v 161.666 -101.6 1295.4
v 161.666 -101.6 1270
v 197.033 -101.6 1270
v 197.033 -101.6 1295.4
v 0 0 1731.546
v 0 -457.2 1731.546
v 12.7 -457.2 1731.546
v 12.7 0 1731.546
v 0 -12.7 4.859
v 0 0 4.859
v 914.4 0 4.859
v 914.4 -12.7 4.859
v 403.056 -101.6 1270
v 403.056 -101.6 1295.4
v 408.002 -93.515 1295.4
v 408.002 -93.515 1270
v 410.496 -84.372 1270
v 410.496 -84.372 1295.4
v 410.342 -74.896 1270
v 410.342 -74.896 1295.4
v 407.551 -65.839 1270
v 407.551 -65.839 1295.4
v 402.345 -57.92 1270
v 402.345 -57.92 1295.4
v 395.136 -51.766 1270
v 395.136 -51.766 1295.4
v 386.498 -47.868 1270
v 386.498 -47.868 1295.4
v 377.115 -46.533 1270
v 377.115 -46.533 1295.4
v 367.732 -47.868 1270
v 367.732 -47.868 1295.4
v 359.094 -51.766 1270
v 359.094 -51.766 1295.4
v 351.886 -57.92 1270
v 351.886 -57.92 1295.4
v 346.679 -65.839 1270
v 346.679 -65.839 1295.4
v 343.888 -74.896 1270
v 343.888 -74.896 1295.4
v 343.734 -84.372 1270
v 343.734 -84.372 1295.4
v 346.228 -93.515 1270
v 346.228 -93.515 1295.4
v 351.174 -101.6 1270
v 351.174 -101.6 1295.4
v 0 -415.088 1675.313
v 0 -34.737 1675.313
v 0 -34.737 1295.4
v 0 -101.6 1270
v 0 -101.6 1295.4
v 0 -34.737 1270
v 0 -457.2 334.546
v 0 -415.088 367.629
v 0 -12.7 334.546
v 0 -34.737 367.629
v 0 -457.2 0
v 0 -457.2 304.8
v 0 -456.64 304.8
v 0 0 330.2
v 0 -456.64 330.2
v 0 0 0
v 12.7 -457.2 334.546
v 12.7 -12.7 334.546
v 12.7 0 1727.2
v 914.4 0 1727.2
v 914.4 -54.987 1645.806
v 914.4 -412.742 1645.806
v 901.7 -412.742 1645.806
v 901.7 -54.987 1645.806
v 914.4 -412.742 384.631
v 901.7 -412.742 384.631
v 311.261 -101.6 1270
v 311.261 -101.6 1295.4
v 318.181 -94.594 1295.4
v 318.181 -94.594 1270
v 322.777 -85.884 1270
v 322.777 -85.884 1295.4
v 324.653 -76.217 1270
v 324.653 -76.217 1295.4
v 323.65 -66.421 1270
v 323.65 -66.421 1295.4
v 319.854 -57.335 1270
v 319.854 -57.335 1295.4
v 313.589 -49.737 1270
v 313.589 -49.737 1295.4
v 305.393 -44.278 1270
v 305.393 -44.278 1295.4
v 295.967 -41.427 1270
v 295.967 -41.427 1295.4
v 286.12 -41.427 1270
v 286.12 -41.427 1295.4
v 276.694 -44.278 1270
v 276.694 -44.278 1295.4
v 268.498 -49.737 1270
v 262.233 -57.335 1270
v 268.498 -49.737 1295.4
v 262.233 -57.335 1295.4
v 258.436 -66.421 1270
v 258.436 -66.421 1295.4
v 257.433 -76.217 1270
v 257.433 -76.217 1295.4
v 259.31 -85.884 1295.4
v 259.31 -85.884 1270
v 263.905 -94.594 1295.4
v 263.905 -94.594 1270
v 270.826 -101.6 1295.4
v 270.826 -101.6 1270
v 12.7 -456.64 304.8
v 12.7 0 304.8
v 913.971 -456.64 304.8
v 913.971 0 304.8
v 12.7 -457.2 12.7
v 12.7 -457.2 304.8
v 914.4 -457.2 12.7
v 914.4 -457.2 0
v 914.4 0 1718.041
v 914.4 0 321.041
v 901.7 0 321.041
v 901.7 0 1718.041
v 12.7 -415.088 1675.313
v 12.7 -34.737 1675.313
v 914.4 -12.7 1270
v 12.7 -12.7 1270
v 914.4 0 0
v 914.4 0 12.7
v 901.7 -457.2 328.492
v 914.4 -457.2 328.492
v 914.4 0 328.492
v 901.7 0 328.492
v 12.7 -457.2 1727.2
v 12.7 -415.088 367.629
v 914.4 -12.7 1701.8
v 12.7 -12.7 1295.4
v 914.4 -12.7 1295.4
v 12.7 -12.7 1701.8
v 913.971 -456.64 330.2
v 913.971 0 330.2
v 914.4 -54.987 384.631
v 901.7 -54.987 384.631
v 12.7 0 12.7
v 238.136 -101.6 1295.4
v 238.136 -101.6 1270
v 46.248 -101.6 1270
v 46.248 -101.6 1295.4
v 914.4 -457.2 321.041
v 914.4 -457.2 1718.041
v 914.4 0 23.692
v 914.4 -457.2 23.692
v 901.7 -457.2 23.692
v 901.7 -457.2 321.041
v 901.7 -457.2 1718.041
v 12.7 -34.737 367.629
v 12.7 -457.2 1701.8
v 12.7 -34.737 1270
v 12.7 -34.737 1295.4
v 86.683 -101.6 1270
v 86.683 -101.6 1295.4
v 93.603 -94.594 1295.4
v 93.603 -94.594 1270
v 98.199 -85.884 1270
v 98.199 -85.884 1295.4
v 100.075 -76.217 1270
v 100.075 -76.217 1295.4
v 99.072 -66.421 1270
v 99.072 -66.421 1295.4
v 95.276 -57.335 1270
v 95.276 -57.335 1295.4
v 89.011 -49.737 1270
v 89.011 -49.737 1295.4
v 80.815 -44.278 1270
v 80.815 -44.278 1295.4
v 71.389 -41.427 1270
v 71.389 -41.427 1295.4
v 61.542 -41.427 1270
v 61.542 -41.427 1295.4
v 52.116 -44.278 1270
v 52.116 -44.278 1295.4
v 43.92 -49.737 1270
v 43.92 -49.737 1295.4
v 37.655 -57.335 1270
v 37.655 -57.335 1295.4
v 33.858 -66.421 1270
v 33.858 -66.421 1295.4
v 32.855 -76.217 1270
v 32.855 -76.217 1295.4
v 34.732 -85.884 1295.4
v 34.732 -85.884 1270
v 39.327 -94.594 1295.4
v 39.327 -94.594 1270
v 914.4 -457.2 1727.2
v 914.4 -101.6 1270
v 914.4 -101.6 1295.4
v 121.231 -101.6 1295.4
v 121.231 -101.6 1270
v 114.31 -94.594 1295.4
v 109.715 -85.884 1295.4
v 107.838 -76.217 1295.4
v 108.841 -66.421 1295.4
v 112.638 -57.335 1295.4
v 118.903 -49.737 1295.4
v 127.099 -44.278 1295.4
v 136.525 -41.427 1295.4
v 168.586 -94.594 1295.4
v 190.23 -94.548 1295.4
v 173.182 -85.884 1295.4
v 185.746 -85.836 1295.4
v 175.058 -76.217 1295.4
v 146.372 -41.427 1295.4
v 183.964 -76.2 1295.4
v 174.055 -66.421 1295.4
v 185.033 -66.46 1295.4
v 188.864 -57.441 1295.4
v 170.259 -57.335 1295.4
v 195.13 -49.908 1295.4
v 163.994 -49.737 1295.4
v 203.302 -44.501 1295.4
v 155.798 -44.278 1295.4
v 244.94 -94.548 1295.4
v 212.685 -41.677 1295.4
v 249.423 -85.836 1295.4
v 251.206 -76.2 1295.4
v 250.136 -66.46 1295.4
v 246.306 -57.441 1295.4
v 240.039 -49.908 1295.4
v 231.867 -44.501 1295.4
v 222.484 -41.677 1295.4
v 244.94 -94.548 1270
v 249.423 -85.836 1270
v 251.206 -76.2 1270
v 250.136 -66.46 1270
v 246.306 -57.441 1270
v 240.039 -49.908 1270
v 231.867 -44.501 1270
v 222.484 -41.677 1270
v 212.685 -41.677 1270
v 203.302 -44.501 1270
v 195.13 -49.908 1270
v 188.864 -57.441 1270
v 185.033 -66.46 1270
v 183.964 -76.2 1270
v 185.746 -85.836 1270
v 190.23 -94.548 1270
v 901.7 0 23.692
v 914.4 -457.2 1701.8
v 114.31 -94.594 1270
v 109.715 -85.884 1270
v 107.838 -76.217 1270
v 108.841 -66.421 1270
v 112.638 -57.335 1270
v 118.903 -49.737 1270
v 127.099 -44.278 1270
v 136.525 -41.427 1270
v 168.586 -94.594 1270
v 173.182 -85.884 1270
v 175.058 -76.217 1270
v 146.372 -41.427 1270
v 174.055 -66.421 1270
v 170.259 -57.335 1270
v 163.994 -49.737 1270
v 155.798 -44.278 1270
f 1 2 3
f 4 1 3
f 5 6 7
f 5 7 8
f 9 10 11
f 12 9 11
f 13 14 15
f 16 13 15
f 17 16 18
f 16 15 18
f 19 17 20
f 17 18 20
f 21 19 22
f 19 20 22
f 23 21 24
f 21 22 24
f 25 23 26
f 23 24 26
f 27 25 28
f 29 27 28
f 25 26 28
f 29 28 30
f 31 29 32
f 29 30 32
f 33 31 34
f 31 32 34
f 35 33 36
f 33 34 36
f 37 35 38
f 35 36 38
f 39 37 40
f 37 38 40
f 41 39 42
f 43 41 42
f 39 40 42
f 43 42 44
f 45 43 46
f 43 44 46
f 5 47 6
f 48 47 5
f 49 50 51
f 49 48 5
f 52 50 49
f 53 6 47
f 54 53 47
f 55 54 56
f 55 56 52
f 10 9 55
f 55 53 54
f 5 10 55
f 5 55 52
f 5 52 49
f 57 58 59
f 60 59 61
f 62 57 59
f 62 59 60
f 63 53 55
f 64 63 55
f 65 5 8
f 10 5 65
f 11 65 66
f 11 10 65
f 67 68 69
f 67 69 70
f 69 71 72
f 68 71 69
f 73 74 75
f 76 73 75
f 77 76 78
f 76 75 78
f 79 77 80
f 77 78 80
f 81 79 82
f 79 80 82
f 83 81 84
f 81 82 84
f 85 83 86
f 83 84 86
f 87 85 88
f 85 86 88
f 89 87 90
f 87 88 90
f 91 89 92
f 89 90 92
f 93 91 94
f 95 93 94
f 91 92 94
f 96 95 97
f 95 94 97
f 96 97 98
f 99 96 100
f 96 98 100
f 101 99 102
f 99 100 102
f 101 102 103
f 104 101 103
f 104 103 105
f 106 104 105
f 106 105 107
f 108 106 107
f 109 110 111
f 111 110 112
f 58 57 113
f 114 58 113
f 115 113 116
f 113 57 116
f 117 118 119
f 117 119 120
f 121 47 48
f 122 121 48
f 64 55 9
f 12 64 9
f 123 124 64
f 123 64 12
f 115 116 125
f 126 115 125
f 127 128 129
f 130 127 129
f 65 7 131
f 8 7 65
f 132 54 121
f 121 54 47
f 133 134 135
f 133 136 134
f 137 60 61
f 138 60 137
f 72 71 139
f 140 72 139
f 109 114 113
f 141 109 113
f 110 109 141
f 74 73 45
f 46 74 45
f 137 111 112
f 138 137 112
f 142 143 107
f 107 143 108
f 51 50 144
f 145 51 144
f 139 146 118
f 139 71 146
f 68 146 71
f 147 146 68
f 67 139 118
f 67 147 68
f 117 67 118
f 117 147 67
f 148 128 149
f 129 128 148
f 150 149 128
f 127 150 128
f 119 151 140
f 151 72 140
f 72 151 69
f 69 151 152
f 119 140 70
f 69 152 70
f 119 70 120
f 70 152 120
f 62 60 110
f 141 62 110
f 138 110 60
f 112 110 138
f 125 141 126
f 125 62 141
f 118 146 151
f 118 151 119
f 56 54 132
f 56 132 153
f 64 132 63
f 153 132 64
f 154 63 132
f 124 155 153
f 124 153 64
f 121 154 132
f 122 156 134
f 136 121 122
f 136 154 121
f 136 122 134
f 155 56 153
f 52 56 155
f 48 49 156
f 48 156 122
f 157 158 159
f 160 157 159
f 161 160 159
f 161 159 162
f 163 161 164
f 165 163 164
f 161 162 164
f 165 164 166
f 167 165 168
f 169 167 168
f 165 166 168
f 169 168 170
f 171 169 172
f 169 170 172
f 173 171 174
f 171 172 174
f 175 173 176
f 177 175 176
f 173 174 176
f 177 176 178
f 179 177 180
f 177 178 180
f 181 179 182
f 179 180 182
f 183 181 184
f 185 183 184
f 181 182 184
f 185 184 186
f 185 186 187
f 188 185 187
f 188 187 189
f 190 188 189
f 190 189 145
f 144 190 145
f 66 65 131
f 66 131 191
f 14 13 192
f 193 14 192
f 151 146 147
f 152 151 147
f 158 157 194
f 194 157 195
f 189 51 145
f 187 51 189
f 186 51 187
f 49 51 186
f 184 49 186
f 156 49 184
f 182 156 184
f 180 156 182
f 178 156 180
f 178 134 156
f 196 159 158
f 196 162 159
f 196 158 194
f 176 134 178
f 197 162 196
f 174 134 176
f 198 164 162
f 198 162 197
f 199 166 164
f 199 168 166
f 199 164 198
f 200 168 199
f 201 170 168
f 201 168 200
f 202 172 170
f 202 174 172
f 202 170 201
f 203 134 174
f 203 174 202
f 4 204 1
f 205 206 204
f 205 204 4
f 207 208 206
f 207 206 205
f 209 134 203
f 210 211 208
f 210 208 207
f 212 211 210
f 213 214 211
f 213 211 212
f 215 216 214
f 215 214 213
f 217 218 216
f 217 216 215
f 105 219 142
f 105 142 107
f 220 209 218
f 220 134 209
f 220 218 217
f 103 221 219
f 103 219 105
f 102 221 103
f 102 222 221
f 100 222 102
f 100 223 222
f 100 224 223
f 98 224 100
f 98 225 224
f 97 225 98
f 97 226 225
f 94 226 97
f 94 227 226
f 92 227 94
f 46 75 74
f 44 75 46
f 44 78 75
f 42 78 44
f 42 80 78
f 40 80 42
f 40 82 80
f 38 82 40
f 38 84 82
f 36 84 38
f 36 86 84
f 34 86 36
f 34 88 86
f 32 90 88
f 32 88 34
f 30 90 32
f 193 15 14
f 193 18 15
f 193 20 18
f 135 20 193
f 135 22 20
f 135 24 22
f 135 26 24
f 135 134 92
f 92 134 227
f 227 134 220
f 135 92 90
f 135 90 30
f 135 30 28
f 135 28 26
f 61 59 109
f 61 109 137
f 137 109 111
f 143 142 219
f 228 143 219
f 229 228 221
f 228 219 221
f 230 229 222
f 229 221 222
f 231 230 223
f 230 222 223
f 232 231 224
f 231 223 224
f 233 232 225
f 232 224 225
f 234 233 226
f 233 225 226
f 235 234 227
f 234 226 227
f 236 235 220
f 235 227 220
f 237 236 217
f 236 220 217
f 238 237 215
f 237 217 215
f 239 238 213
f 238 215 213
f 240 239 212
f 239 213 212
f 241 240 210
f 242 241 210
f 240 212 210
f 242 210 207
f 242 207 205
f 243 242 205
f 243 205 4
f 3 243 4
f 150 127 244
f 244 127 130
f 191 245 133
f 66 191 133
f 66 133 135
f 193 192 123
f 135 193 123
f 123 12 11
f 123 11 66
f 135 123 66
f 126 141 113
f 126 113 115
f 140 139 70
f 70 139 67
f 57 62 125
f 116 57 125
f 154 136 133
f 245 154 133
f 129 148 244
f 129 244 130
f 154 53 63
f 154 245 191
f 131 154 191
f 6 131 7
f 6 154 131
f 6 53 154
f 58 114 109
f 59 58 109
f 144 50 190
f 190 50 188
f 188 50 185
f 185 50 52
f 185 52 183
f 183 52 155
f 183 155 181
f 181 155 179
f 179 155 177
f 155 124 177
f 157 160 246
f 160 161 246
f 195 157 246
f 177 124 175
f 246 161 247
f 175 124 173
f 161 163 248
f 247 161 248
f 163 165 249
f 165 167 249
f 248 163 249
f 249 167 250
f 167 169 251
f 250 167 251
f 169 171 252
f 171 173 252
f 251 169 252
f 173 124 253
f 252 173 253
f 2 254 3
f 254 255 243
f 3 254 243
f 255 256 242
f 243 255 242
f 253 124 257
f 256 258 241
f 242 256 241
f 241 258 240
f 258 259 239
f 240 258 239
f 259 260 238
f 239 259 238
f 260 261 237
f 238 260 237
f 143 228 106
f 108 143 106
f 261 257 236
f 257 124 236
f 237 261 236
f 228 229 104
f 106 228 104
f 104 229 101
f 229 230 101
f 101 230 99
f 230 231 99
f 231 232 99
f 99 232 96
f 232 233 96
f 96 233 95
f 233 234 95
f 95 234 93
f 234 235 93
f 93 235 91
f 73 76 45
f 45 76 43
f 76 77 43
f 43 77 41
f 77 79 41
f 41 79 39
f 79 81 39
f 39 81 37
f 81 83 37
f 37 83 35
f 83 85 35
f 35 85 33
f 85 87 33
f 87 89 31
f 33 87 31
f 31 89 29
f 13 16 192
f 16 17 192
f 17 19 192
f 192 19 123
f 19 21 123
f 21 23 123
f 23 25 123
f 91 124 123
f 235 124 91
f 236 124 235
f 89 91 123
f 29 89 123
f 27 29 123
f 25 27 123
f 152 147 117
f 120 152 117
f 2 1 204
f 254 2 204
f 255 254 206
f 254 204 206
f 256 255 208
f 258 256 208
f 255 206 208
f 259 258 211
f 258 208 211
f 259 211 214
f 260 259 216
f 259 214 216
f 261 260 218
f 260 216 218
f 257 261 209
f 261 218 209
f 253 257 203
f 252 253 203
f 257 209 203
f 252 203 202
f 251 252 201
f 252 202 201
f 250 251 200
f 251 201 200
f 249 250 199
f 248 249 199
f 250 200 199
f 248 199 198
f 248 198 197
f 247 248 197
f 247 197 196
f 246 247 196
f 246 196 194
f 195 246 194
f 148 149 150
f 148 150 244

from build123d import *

# Parameters (mm, degrees)
F0_W      = 914.4
F0_H      = 457.2
F1_DEPTH  = 12.7
F2_W      = 457.2
F2_H      = 304.8
F3_DEPTH  = 12.7
F5_W      = 457.2
F5_H      = 304.8
F6_DEPTH  = 12.7
F8_W      = 913.9710068703
F8_H      = 456.640124321
F9_DEPTH  = 25.4
F10_W     = 914.4
F10_H     = 1701.8
F11_DEPTH = 12.7
F13_W     = 914.4
F13_H     = 457.2
F14_DEPTH = 25.4
F15_W     = 457.2
F15_H     = 1397
F16_DEPTH = 12.7
F17_W     = 357.7546179295
F17_H     = 1261.1754238605
F18_DEPTH = 914.401
F19_W     = 457.2
F19_H     = 1397
F20_DEPTH = 12.7
F21_W     = 380.351215601
F21_H     = 1307.6837956905
F22_DEPTH = 914.401
F24_W     = 914.4
F24_H     = 101.6
F25_DEPTH = 25.4
F27_DEPTH = 25.4
F29_DEPTH = 25.4
F31_DEPTH = 25.4
F33_DEPTH = 25.4
F35_DEPTH = 25.4


# Not quite as in the source:
# - ends of sketch curves that miss each other by under 0.0002 mm in the source are joined


with BuildPart() as f1:
    # F0 (on Top) → F1 (new body)
    with BuildSketch(Plane.XY):
        with Locations((457.2, -228.6)):
            Rectangle(F0_W, F0_H)
    extrude(amount=F1_DEPTH)

    # F2 (on Right) → F3 (join)
    with BuildSketch(Plane.YZ):
        with Locations((-228.6, 152.4)):
            Rectangle(F2_W, F2_H)
    extrude(amount=F3_DEPTH)

    # F8 (on offset) → F9 (join)
    with BuildSketch(Plane.XY.offset(304.8)):
        with Locations((456.9855034351, -228.3200621605)):
            Rectangle(F8_W, F8_H)
    extrude(amount=F9_DEPTH)


with BuildPart() as f6:
    # F5 (on offset) → F6 (new body)
    with BuildSketch(Plane.YZ.offset(914.4)):
        with Locations((-228.6, 176.0915509423)):
            Rectangle(F5_W, F5_H)
    extrude(amount=-F6_DEPTH)


with BuildPart() as f11:
    # F10 (on Front) → F11 (new body)
    with BuildSketch(Plane.XZ):
        with Locations((457.2, 855.7587931213)):
            Rectangle(F10_W, F10_H)
    extrude(amount=F11_DEPTH)

    # F13 (on offset) → F14 (join)
    with BuildSketch(Plane.XY.offset(1701.8)):
        with Locations((457.2, -228.6)):
            Rectangle(F13_W, F13_H)
    extrude(amount=F14_DEPTH)

    # F19 (on Right) → F20 (join)
    with BuildSketch(Plane.YZ):
        with Locations((-228.6, 1033.0463655774)):
            Rectangle(F19_W, F19_H)
    extrude(amount=F20_DEPTH)

    # F21 (on Right) → F22 (cut, through all)
    with BuildSketch(Plane.YZ):
        with Locations((-224.9127179384, 1021.4712172747)):
            Rectangle(F21_W, F21_H)
    extrude(amount=F22_DEPTH, mode=Mode.SUBTRACT)

    # F24 (on offset) → F25 (join)
    with BuildSketch(Plane.XY.offset(1270)):
        with Locations((457.2, -50.8)):
            Rectangle(F24_W, F24_H)
    extrude(amount=F25_DEPTH)

    # F26 (on face) → F27 (cut)
    with BuildSketch(Plane.XY.offset(1295.4)):
        with BuildLine():
            Line((46.2475046515, -101.6), (86.683191359, -101.6))
            ThreePointArc((86.683191359, -101.6), (66.4653480053, -41.0647853812), (46.2475046515, -101.6))
        make_face()
    extrude(amount=-F27_DEPTH, mode=Mode.SUBTRACT)

    # F28 (on face) → F29 (cut)
    with BuildSketch(Plane.XY.offset(1295.4)):
        with BuildLine():
            Line((121.2305128574, -101.6), (161.6661995649, -101.6))
            ThreePointArc((161.6661995649, -101.6), (141.4483562112, -41.0647853812), (121.2305128574, -101.6))
        make_face()
    extrude(amount=-F29_DEPTH, mode=Mode.SUBTRACT)

    # F30 (on face) → F31 (cut)
    with BuildSketch(Plane.XY.offset(1295.4)):
        with BuildLine():
            Line((197.0332803288, -101.6), (238.13604395, -101.6))
            ThreePointArc((238.13604395, -101.6), (217.5846621394, -41.3188191494), (197.0332803288, -101.6))
        make_face()
    extrude(amount=-F31_DEPTH, mode=Mode.SUBTRACT)

    # F32 (on face) → F33 (cut)
    with BuildSketch(Plane.XY.offset(1295.4)):
        with BuildLine():
            Line((270.8255052567, -101.6), (311.2611919641, -101.6))
            ThreePointArc((311.2611919641, -101.6), (291.0433486104, -41.0647841533), (270.8255052567, -101.6))
        make_face()
    extrude(amount=-F33_DEPTH, mode=Mode.SUBTRACT)

    # F34 (on face) → F35 (cut)
    with BuildSketch(Plane.XY.offset(1295.4)):
        with BuildLine():
            Line((351.1739761807, -101.6), (403.0564038776, -101.6))
            ThreePointArc((403.0564038776, -101.6), (377.1151900291, -46.5327916681), (351.1739761807, -101.6))
        make_face()
    extrude(amount=-F35_DEPTH, mode=Mode.SUBTRACT)


with BuildPart() as f16:
    # F15 (on offset) → F16 (new body)
    with BuildSketch(Plane.YZ.offset(914.4)):
        with Locations((-228.6, 1019.5414156894)):
            Rectangle(F15_W, F15_H)
    extrude(amount=-F16_DEPTH)

    # F17 (on offset) → F18 (cut, through all)
    with BuildSketch(Plane.YZ.offset(914.4)):
        with Locations((-233.8642030954, 1015.2183622122)):
            Rectangle(F17_W, F17_H)
    extrude(amount=-F18_DEPTH, mode=Mode.SUBTRACT)


solid = Compound([f1.part, f6.part, f11.part, f16.part])
